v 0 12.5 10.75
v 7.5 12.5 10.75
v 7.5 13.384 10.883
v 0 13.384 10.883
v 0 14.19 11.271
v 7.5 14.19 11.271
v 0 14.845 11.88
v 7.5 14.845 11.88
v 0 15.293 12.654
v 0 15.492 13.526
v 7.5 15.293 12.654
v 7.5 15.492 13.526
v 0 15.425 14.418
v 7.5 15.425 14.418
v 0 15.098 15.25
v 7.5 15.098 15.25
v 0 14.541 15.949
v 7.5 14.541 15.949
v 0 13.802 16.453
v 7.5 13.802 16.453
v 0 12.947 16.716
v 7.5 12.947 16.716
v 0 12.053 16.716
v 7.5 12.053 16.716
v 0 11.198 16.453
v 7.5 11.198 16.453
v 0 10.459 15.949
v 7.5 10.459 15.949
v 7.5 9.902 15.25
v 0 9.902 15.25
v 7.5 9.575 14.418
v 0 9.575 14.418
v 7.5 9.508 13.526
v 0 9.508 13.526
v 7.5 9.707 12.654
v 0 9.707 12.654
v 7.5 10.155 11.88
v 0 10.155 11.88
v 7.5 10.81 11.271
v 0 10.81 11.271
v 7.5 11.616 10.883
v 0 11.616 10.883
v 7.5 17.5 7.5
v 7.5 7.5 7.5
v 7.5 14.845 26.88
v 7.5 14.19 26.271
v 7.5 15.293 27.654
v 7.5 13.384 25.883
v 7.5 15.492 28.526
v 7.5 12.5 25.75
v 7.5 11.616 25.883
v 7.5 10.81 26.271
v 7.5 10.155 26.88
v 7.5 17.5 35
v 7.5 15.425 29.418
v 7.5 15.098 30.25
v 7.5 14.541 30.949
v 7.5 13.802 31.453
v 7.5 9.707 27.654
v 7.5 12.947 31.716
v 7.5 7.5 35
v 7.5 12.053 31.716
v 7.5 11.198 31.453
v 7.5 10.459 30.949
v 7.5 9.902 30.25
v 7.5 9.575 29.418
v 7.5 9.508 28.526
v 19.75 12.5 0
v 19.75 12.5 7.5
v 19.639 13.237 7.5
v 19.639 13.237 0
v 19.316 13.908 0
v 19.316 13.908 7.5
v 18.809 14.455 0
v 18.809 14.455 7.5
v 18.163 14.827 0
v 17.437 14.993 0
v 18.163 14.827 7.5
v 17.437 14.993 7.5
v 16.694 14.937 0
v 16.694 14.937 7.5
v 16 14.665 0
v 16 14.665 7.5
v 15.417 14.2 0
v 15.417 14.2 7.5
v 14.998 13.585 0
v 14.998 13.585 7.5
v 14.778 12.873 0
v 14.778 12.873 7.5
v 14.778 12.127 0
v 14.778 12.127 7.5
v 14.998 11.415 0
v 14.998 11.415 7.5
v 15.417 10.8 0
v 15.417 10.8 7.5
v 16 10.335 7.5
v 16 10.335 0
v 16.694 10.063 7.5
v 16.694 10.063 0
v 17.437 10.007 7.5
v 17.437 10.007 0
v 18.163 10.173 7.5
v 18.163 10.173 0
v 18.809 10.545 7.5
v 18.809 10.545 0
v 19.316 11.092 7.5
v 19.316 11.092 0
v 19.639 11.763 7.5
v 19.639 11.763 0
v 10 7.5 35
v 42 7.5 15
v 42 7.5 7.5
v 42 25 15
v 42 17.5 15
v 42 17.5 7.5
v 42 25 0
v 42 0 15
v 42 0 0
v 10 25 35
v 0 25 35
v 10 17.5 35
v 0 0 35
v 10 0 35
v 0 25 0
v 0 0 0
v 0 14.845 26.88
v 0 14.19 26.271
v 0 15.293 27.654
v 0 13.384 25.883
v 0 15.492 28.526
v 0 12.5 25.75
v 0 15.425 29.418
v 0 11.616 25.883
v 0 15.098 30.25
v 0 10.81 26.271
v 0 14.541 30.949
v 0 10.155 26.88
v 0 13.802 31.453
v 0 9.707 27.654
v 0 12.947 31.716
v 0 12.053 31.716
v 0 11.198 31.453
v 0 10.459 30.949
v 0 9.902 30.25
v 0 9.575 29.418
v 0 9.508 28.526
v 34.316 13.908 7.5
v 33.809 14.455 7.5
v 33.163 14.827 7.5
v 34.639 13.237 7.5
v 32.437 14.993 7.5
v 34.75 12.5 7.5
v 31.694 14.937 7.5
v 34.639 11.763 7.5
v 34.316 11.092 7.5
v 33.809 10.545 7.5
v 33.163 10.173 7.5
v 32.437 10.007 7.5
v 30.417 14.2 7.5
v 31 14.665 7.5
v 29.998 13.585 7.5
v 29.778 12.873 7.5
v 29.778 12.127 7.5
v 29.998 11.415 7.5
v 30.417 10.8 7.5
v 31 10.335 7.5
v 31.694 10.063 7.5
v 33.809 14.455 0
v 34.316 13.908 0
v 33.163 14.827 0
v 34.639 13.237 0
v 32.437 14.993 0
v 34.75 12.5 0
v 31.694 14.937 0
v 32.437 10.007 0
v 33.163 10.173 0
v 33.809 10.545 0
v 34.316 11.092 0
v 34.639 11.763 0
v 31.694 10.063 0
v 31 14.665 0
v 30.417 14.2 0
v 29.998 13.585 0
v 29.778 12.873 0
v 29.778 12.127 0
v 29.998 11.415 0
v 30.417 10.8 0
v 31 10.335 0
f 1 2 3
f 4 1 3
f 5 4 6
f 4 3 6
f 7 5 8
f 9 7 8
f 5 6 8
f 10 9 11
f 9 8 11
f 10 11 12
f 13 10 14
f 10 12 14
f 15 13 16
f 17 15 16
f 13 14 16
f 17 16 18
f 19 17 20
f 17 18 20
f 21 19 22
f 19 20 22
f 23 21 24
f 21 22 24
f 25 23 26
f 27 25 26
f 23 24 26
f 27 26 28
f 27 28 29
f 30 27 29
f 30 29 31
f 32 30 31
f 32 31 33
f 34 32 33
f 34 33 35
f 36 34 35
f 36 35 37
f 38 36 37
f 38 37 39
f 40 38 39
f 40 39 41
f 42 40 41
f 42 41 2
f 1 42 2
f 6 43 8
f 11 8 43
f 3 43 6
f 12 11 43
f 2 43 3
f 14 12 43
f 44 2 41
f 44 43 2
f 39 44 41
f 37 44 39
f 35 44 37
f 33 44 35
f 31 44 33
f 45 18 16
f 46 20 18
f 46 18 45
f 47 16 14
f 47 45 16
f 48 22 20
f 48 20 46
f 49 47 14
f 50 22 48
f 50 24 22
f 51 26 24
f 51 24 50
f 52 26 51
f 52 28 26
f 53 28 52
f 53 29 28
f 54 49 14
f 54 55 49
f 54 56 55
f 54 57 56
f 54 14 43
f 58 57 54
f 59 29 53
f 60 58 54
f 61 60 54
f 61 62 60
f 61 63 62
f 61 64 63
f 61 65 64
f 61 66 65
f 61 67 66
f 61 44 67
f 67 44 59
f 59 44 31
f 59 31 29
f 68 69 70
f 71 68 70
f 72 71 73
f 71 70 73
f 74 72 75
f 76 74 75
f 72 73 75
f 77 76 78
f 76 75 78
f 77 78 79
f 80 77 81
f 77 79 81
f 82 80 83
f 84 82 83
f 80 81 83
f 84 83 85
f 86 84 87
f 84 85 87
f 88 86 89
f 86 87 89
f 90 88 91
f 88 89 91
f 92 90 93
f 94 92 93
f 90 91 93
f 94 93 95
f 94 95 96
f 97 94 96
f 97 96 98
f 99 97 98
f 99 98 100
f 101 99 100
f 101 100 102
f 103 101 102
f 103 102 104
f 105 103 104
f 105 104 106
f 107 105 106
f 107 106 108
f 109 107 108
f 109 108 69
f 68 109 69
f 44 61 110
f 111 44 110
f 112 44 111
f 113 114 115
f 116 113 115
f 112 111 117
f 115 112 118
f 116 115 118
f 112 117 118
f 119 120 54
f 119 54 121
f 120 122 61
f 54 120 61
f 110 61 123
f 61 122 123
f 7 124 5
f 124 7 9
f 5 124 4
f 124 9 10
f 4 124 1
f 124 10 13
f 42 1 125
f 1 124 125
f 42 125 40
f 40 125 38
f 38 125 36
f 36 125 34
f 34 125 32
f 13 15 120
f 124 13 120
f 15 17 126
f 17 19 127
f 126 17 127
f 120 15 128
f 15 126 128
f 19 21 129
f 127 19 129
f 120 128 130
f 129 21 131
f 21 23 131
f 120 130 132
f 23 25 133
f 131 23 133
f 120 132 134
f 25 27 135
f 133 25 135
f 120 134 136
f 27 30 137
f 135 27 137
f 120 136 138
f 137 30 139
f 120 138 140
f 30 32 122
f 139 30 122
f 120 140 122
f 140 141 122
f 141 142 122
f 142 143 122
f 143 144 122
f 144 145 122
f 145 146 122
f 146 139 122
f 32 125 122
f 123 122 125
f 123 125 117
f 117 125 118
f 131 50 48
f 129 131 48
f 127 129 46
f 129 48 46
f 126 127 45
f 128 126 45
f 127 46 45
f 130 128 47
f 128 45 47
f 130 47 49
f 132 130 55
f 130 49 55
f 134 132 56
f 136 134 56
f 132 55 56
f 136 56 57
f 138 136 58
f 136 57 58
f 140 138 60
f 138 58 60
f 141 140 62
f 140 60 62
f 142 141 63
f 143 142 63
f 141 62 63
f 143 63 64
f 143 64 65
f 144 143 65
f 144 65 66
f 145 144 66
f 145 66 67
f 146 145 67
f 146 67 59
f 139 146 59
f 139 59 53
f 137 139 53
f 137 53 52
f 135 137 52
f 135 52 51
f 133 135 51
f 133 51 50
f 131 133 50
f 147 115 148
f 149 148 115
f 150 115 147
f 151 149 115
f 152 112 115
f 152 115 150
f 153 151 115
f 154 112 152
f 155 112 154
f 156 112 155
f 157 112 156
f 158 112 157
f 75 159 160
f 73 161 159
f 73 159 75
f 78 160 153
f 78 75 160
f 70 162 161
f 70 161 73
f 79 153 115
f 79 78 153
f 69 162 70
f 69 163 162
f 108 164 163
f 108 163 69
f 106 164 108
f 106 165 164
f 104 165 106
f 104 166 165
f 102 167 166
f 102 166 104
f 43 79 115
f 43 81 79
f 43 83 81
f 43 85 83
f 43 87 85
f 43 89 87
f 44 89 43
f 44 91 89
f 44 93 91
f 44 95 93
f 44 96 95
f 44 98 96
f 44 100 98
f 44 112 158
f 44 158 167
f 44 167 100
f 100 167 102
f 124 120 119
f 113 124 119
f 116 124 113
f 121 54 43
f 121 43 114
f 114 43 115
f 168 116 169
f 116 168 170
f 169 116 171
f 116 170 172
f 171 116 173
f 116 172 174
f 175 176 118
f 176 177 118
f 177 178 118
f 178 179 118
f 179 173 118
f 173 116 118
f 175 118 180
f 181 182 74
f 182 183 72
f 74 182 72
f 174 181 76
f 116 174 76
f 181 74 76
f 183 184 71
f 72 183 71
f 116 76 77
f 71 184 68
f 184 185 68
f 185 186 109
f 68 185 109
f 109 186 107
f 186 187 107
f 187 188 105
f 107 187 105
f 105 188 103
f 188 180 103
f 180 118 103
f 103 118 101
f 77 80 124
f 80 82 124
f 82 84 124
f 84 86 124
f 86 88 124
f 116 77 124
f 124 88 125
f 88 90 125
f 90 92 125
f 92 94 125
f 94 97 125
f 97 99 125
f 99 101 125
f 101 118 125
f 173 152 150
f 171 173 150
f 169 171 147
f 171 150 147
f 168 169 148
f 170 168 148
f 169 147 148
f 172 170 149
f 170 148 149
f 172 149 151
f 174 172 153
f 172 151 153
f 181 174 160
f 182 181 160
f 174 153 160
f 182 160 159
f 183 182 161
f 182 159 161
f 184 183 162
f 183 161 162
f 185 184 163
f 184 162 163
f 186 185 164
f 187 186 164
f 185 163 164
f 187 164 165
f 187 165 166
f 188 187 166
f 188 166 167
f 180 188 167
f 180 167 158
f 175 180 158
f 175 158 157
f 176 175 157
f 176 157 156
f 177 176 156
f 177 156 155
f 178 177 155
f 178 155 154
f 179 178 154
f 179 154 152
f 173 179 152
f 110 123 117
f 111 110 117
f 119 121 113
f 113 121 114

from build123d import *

# Parameters (mm, degrees)
BOSS_EXTRUDE1_DEPTH = 25
SHELL1_T            = -7.5
SKETCH3_R           = 3
CUT_EXTRUDE1_DEPTH  = 30
SKETCH4_R           = 2.5
CUT_EXTRUDE2_DEPTH  = 10


with BuildPart() as part:
    # Sketch2 → Boss-Extrude1 (new body)
    with BuildSketch(Plane(origin=(0, 0, 0), x_dir=(1, 0, 0), z_dir=(0, 1, 0))):
        Polygon((10, -35), (42, -15), (42, 0), (0, 0), (0, -35), align=None)
    extrude(amount=BOSS_EXTRUDE1_DEPTH)

    # Shell1
    shell1_openings = [part.faces().sort_by_distance(p)[0] for p in [
        (42, 12.5, 7.5),
        (26, 12.5, 25),
        (5, 12.5, 35),
    ]]
    offset(amount=SHELL1_T, openings=shell1_openings, kind=Kind.INTERSECTION)

    # Sketch3 → Cut-Extrude1 (cut)
    with BuildSketch(Plane(origin=(7.5, 0, 0), x_dir=(0, 0, -1), z_dir=(1, 0, 0))):
        with Locations((-28.75, 12.5)):
            Circle(SKETCH3_R)
        with Locations((-13.75, 12.5)):
            Circle(SKETCH3_R)
    extrude(amount=-CUT_EXTRUDE1_DEPTH, mode=Mode.SUBTRACT)

    # Sketch4 → Cut-Extrude2 (cut)
    with BuildSketch(Plane.XY.offset(7.5)):
        with Locations((17.25, 12.5)):
            Circle(SKETCH4_R)
        with Locations((32.25, 12.5)):
            Circle(SKETCH4_R)
    extrude(amount=-CUT_EXTRUDE2_DEPTH, mode=Mode.SUBTRACT)


solid = part.part
